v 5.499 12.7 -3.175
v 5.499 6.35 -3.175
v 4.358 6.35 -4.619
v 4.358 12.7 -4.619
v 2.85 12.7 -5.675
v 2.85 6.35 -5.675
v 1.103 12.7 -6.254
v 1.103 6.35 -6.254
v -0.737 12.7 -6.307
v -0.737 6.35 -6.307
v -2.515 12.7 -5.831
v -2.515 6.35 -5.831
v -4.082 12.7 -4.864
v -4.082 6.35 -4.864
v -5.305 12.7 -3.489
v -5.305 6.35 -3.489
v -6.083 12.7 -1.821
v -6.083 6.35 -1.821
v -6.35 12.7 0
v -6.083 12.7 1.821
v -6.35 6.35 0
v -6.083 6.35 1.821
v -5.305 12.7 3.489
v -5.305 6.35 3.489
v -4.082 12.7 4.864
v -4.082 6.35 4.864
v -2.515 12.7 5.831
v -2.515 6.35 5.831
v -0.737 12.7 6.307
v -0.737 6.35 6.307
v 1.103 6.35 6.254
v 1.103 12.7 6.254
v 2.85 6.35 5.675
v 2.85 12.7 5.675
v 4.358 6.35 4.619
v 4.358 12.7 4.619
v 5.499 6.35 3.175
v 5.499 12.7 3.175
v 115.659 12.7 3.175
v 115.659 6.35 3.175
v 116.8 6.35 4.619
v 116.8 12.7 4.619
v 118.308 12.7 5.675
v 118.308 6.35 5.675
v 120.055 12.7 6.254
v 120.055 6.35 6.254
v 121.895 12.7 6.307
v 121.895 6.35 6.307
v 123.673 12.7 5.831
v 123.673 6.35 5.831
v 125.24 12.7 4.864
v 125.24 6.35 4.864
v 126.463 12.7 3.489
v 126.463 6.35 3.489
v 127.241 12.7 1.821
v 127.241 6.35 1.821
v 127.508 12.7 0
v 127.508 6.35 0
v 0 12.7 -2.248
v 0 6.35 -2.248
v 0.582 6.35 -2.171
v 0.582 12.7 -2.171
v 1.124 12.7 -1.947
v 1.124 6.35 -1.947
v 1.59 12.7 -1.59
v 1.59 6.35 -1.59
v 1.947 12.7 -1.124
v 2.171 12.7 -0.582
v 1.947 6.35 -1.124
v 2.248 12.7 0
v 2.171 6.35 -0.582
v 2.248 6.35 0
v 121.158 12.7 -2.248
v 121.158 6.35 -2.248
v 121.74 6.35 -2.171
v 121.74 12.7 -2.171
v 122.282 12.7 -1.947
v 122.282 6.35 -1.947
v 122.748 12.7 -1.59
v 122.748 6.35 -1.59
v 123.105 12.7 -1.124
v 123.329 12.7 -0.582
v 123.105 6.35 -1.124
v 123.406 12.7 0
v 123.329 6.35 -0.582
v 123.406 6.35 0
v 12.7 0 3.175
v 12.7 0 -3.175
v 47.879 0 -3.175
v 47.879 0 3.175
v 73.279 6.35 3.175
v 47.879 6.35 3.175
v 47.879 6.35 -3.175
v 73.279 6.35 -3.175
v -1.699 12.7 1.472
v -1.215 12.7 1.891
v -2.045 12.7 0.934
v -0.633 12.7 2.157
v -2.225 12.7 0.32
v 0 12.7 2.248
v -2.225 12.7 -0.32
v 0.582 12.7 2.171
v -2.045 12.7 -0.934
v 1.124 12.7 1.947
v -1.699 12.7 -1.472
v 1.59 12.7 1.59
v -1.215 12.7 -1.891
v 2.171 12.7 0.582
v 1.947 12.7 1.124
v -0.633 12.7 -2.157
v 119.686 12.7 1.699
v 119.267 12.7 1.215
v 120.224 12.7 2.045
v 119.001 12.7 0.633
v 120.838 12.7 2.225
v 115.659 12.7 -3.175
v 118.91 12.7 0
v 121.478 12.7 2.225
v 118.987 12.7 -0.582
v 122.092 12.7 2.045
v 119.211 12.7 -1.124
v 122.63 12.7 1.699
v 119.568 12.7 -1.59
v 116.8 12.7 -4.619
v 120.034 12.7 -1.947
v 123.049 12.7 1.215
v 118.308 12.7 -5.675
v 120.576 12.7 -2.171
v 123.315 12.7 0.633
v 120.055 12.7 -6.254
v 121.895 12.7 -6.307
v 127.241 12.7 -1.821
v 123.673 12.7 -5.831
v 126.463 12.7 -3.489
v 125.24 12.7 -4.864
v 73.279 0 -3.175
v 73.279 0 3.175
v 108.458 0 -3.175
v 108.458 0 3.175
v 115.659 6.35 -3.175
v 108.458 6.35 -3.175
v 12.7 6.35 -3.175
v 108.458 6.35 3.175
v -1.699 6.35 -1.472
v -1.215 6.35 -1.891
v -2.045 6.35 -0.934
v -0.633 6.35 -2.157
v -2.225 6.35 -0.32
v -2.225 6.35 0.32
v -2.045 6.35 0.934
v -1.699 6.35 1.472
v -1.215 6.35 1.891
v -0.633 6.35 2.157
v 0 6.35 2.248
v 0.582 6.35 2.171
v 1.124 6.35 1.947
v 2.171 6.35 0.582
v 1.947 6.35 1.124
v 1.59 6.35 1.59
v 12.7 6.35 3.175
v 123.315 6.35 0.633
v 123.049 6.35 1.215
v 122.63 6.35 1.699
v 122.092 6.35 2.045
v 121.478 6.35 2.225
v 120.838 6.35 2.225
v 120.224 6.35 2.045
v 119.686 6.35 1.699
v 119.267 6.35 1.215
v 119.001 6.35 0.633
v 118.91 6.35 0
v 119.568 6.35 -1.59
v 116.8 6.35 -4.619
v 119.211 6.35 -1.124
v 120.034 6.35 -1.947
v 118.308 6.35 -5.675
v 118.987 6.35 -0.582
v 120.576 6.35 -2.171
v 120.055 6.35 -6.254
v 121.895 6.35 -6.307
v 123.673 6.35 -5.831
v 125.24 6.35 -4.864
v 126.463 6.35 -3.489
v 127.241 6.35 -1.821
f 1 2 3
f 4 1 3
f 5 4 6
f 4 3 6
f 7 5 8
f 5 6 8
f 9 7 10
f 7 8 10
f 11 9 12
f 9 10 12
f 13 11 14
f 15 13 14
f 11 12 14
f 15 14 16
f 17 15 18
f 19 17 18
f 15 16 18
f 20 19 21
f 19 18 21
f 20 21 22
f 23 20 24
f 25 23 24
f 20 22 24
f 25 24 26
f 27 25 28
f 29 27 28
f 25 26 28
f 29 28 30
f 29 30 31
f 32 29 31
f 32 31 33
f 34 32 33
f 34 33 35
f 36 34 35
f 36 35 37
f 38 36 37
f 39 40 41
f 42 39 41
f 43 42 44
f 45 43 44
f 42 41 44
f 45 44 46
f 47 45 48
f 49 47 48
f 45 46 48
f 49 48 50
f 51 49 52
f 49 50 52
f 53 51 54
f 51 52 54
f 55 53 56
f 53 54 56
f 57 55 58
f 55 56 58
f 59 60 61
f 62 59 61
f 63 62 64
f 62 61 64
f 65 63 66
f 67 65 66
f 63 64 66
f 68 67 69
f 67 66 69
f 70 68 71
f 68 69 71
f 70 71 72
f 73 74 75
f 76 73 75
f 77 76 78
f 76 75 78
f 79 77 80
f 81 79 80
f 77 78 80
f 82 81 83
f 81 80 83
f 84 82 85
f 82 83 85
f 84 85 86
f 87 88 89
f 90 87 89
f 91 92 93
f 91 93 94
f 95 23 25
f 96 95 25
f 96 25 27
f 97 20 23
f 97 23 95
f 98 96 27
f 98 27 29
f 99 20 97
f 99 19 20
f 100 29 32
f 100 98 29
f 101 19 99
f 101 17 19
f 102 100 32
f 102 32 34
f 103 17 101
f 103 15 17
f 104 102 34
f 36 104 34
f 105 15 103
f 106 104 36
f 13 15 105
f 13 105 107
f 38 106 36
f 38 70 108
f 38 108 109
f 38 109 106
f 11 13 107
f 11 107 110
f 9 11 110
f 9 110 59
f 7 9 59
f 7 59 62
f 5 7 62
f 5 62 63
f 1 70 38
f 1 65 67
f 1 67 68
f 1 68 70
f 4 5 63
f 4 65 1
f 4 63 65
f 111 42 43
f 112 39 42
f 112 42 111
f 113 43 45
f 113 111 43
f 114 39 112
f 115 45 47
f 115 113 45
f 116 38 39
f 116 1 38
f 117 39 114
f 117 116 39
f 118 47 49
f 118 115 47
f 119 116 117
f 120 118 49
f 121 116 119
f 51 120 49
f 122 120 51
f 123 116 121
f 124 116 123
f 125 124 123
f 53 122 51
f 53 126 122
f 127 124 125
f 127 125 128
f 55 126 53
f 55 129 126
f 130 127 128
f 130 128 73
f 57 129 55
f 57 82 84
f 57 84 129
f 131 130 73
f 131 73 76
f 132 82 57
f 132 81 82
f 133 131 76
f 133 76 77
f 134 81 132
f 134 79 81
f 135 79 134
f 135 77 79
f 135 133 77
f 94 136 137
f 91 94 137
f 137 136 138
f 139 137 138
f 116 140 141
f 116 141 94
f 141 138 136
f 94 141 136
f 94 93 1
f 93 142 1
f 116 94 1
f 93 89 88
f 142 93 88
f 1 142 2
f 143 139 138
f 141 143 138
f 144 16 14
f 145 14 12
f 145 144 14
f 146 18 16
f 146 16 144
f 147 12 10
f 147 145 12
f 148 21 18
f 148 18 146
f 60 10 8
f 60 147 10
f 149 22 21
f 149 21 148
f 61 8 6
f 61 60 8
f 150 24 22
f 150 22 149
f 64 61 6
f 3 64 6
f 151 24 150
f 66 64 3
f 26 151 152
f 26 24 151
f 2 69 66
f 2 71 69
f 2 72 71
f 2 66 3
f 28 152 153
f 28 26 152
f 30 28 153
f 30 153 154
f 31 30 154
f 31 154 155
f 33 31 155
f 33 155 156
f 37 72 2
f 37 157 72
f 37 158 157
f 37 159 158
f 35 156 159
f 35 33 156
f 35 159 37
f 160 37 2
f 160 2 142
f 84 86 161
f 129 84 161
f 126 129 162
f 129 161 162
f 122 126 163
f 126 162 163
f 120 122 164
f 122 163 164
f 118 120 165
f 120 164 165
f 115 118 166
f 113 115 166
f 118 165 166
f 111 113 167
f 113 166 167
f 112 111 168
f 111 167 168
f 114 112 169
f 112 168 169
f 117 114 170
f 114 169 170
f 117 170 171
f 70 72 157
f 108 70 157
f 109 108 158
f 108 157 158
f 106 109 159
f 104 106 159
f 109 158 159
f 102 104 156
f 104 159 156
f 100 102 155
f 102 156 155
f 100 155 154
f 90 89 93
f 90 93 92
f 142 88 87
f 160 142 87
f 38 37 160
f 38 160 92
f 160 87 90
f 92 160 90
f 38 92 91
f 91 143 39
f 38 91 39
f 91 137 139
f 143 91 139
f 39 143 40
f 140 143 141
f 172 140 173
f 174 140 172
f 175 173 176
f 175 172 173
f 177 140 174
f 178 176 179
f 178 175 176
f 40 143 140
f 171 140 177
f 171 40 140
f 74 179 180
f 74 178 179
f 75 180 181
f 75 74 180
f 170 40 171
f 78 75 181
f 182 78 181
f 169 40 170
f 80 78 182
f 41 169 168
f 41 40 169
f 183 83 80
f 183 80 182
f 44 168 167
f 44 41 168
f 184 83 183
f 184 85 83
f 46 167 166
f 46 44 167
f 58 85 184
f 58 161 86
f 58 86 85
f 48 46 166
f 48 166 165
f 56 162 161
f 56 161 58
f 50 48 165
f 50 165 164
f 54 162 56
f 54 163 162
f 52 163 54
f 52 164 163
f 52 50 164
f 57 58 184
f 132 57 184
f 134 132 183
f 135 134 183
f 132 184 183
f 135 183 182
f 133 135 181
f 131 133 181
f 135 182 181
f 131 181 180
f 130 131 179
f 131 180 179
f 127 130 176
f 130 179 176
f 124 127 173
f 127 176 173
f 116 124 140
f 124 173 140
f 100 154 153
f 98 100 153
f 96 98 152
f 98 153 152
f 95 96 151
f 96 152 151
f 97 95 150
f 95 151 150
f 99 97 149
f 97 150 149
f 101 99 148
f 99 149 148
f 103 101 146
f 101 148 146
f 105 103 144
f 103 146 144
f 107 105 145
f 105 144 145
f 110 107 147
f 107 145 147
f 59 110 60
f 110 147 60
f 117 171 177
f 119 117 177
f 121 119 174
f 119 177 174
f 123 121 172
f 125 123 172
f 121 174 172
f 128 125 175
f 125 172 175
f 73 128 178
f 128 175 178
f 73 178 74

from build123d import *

# Parameters (mm, degrees)
BOSS_EXTRUDE1_DEPTH = 12.7
SKETCH2_R           = 2.2479
CUT_EXTRUDE1_DEPTH  = 6.35
SKETCH3_W           = 25.4
SKETCH3_H           = 6.35
CUT_EXTRUDE2_DEPTH  = 6.35


with BuildPart() as part:
    # Sketch1 → Boss-Extrude1 (new body)
    with BuildSketch(Plane(origin=(0, 0, 0), x_dir=(1, 0, 0), z_dir=(0, 1, 0))):
        with BuildLine():
            ThreePointArc((0, -2.2479), (-2.2479, 0), (0, 2.2479))
            Line((0, 2.2479), (0, 3.175))
            ThreePointArc((0, 3.175), (-3.175, 0), (0, -3.175))
            Line((0, -3.175), (0, -2.2479))
        make_face()
        with BuildLine():
            ThreePointArc((0, -3.175), (-3.175, 0), (0, 3.175))
            Line((0, 3.175), (5.499261314, 3.175))
            ThreePointArc((5.499261314, 3.175), (-6.35, 0), (5.499261314, -3.175))
            Line((5.499261314, -3.175), (0, -3.175))
        make_face()
        with BuildLine():
            ThreePointArc((0, 2.2479), (1.589505333, 1.589505333), (2.2479, 0))
            Line((2.2479, 0), (3.175, 0))
            ThreePointArc((3.175, 0), (2.24506403, 2.24506403), (0, 3.175))
            Line((0, 3.175), (0, 2.2479))
        make_face()
        with BuildLine():
            Line((3.175, 0), (2.2479, 0))
            ThreePointArc((2.2479, 0), (1.589505333, -1.589505333), (0, -2.2479))
            Line((0, -2.2479), (0, -3.175))
            ThreePointArc((0, -3.175), (2.24506403, -2.24506403), (3.175, 0))
        make_face()
        with BuildLine():
            ThreePointArc((0, 3.175), (2.24506403, 2.24506403), (3.175, 0))
            Line((3.175, 0), (6.35, 0))
            ThreePointArc((6.35, 0), (6.133628997, 1.643500936), (5.499261314, 3.175))
            Line((5.499261314, 3.175), (0, 3.175))
        make_face()
        with BuildLine():
            Line((6.35, 0), (3.175, 0))
            ThreePointArc((3.175, 0), (2.24506403, -2.24506403), (0, -3.175))
            Line((0, -3.175), (5.499261314, -3.175))
            ThreePointArc((5.499261314, -3.175), (6.133628997, -1.643500936), (6.35, 0))
        make_face()
        with BuildLine():
            ThreePointArc((5.499261314, 3.175), (6.133628997, 1.643500936), (6.35, 0))
            Line((6.35, 0), (114.808, 0))
            ThreePointArc((114.808, 0), (115.024371003, 1.643500936), (115.658738686, 3.175))
            Line((115.658738686, 3.175), (5.499261314, 3.175))
        make_face()
        with BuildLine():
            Line((114.808, 0), (6.35, 0))
            ThreePointArc((6.35, 0), (6.133628997, -1.643500936), (5.499261314, -3.175))
            Line((5.499261314, -3.175), (115.658738686, -3.175))
            ThreePointArc((115.658738686, -3.175), (115.024371003, -1.643500936), (114.808, 0))
        make_face()
        with BuildLine():
            ThreePointArc((115.658738686, 3.175), (115.024371003, 1.643500936), (114.808, 0))
            Line((114.808, 0), (117.983, 0))
            ThreePointArc((117.983, 0), (118.91293597, 2.24506403), (121.158, 3.175))
            Line((121.158, 3.175), (115.658738686, 3.175))
        make_face()
        with BuildLine():
            Line((117.983, 0), (114.808, 0))
            ThreePointArc((114.808, 0), (115.024371003, -1.643500936), (115.658738686, -3.175))
            Line((115.658738686, -3.175), (121.158, -3.175))
            ThreePointArc((121.158, -3.175), (118.91293597, -2.24506403), (117.983, 0))
        make_face()
        with BuildLine():
            ThreePointArc((121.158, 3.175), (118.91293597, 2.24506403), (117.983, 0))
            Line((117.983, 0), (118.9101, 0))
            ThreePointArc((118.9101, 0), (119.568494667, 1.589505333), (121.158, 2.2479))
            Line((121.158, 2.2479), (121.158, 3.175))
        make_face()
        with BuildLine():
            Line((118.9101, 0), (117.983, 0))
            ThreePointArc((117.983, 0), (118.91293597, -2.24506403), (121.158, -3.175))
            ThreePointArc((121.158, -3.175), (123.40306403, -2.24506403), (124.333, 0))
            ThreePointArc((124.333, 0), (123.40306403, 2.24506403), (121.158, 3.175))
            Line((121.158, 3.175), (121.158, 2.2479))
            ThreePointArc((121.158, 2.2479), (122.747505333, 1.589505333), (123.4059, 0))
            ThreePointArc((123.4059, 0), (121.158, -2.2479), (118.9101, 0))
        make_face()
        with BuildLine():
            ThreePointArc((127.508, 0), (122.801500936, 6.133628997), (115.658738686, 3.175))
            Line((115.658738686, 3.175), (121.158, 3.175))
            ThreePointArc((121.158, 3.175), (123.40306403, 2.24506403), (124.333, 0))
            ThreePointArc((124.333, 0), (123.40306403, -2.24506403), (121.158, -3.175))
            Line((121.158, -3.175), (115.658738686, -3.175))
            ThreePointArc((115.658738686, -3.175), (122.801500936, -6.133628997), (127.508, 0))
        make_face()
    extrude(amount=BOSS_EXTRUDE1_DEPTH)

    # Sketch2 → Cut-Extrude1 (cut)
    # profile 1 of 6: a face of its own
    with BuildSketch(Plane.XZ):
        with BuildLine():
            Line((12.7, -3.175), (12.7, 3.175))
            Line((12.7, 3.175), (5.499261314, 3.175))
            ThreePointArc((5.499261314, 3.175), (6.133628997, 1.643500936), (6.35, 0))
            ThreePointArc((6.35, 0), (6.133628997, -1.643500936), (5.499261314, -3.175))
            Line((5.499261314, -3.175), (12.7, -3.175))
        make_face()
    # profile 2 of 6: a face of its own
    with BuildSketch(Plane.XZ):
        with BuildLine():
            ThreePointArc((6.35, 0), (6.133628997, 1.643500936), (5.499261314, 3.175))
            Line((5.499261314, 3.175), (2.654111014, 3.175))
            Line((2.654111014, 3.175), (2.654111014, -3.175))
            Line((2.654111014, -3.175), (5.499261314, -3.175))
            ThreePointArc((5.499261314, -3.175), (6.133628997, -1.643500936), (6.35, 0))
        make_face()
    # profile 3 of 6: a face of its own
    with BuildSketch(Plane.XZ):
        with BuildLine():
            Line((2.654111014, 3.175), (5.499261314, 3.175))
            ThreePointArc((5.499261314, 3.175), (-6.35, 0), (5.499261314, -3.175))
            Line((5.499261314, -3.175), (2.654111014, -3.175))
            Line((2.654111014, -3.175), (2.654111014, 3.175))
        make_face()
        with Locations(Location((0, 0, 0), (0, 0, 270))):
            Circle(SKETCH2_R, mode=Mode.SUBTRACT)
    # profile 4 of 6: a face of its own
    with BuildSketch(Plane.XZ):
        with BuildLine():
            ThreePointArc((127.508, 0), (122.801500936, 6.133628997), (115.658738686, 3.175))
            Line((115.658738686, 3.175), (118.641772853, 3.175))
            Line((118.641772853, 3.175), (118.641772853, -3.175))
            Line((118.641772853, -3.175), (115.658738686, -3.175))
            ThreePointArc((115.658738686, -3.175), (122.801500936, -6.133628997), (127.508, 0))
        make_face()
        with Locations(Location((121.158, 0, 0), (0, 0, 270))):
            Circle(SKETCH2_R, mode=Mode.SUBTRACT)
    # profile 5 of 6: a face of its own
    with BuildSketch(Plane.XZ):
        with BuildLine():
            Line((115.658738686, 3.175), (108.458, 3.175))
            Line((108.458, 3.175), (108.458, -3.175))
            Line((108.458, -3.175), (115.658738686, -3.175))
            ThreePointArc((115.658738686, -3.175), (114.808, 0), (115.658738686, 3.175))
        make_face()
    # profile 6 of 6: a face of its own
    with BuildSketch(Plane.XZ):
        with BuildLine():
            Line((118.641772853, 3.175), (115.658738686, 3.175))
            ThreePointArc((115.658738686, 3.175), (114.808, 0), (115.658738686, -3.175))
            Line((115.658738686, -3.175), (118.641772853, -3.175))
            Line((118.641772853, -3.175), (118.641772853, 3.175))
        make_face()
    extrude(amount=-CUT_EXTRUDE1_DEPTH, mode=Mode.SUBTRACT)

    # Sketch3 → Cut-Extrude2 (cut)
    with BuildSketch(Plane.XZ):
        with Locations((60.579, 0)):
            Rectangle(SKETCH3_W, SKETCH3_H)
    extrude(amount=-CUT_EXTRUDE2_DEPTH, mode=Mode.SUBTRACT)


solid = part.part
